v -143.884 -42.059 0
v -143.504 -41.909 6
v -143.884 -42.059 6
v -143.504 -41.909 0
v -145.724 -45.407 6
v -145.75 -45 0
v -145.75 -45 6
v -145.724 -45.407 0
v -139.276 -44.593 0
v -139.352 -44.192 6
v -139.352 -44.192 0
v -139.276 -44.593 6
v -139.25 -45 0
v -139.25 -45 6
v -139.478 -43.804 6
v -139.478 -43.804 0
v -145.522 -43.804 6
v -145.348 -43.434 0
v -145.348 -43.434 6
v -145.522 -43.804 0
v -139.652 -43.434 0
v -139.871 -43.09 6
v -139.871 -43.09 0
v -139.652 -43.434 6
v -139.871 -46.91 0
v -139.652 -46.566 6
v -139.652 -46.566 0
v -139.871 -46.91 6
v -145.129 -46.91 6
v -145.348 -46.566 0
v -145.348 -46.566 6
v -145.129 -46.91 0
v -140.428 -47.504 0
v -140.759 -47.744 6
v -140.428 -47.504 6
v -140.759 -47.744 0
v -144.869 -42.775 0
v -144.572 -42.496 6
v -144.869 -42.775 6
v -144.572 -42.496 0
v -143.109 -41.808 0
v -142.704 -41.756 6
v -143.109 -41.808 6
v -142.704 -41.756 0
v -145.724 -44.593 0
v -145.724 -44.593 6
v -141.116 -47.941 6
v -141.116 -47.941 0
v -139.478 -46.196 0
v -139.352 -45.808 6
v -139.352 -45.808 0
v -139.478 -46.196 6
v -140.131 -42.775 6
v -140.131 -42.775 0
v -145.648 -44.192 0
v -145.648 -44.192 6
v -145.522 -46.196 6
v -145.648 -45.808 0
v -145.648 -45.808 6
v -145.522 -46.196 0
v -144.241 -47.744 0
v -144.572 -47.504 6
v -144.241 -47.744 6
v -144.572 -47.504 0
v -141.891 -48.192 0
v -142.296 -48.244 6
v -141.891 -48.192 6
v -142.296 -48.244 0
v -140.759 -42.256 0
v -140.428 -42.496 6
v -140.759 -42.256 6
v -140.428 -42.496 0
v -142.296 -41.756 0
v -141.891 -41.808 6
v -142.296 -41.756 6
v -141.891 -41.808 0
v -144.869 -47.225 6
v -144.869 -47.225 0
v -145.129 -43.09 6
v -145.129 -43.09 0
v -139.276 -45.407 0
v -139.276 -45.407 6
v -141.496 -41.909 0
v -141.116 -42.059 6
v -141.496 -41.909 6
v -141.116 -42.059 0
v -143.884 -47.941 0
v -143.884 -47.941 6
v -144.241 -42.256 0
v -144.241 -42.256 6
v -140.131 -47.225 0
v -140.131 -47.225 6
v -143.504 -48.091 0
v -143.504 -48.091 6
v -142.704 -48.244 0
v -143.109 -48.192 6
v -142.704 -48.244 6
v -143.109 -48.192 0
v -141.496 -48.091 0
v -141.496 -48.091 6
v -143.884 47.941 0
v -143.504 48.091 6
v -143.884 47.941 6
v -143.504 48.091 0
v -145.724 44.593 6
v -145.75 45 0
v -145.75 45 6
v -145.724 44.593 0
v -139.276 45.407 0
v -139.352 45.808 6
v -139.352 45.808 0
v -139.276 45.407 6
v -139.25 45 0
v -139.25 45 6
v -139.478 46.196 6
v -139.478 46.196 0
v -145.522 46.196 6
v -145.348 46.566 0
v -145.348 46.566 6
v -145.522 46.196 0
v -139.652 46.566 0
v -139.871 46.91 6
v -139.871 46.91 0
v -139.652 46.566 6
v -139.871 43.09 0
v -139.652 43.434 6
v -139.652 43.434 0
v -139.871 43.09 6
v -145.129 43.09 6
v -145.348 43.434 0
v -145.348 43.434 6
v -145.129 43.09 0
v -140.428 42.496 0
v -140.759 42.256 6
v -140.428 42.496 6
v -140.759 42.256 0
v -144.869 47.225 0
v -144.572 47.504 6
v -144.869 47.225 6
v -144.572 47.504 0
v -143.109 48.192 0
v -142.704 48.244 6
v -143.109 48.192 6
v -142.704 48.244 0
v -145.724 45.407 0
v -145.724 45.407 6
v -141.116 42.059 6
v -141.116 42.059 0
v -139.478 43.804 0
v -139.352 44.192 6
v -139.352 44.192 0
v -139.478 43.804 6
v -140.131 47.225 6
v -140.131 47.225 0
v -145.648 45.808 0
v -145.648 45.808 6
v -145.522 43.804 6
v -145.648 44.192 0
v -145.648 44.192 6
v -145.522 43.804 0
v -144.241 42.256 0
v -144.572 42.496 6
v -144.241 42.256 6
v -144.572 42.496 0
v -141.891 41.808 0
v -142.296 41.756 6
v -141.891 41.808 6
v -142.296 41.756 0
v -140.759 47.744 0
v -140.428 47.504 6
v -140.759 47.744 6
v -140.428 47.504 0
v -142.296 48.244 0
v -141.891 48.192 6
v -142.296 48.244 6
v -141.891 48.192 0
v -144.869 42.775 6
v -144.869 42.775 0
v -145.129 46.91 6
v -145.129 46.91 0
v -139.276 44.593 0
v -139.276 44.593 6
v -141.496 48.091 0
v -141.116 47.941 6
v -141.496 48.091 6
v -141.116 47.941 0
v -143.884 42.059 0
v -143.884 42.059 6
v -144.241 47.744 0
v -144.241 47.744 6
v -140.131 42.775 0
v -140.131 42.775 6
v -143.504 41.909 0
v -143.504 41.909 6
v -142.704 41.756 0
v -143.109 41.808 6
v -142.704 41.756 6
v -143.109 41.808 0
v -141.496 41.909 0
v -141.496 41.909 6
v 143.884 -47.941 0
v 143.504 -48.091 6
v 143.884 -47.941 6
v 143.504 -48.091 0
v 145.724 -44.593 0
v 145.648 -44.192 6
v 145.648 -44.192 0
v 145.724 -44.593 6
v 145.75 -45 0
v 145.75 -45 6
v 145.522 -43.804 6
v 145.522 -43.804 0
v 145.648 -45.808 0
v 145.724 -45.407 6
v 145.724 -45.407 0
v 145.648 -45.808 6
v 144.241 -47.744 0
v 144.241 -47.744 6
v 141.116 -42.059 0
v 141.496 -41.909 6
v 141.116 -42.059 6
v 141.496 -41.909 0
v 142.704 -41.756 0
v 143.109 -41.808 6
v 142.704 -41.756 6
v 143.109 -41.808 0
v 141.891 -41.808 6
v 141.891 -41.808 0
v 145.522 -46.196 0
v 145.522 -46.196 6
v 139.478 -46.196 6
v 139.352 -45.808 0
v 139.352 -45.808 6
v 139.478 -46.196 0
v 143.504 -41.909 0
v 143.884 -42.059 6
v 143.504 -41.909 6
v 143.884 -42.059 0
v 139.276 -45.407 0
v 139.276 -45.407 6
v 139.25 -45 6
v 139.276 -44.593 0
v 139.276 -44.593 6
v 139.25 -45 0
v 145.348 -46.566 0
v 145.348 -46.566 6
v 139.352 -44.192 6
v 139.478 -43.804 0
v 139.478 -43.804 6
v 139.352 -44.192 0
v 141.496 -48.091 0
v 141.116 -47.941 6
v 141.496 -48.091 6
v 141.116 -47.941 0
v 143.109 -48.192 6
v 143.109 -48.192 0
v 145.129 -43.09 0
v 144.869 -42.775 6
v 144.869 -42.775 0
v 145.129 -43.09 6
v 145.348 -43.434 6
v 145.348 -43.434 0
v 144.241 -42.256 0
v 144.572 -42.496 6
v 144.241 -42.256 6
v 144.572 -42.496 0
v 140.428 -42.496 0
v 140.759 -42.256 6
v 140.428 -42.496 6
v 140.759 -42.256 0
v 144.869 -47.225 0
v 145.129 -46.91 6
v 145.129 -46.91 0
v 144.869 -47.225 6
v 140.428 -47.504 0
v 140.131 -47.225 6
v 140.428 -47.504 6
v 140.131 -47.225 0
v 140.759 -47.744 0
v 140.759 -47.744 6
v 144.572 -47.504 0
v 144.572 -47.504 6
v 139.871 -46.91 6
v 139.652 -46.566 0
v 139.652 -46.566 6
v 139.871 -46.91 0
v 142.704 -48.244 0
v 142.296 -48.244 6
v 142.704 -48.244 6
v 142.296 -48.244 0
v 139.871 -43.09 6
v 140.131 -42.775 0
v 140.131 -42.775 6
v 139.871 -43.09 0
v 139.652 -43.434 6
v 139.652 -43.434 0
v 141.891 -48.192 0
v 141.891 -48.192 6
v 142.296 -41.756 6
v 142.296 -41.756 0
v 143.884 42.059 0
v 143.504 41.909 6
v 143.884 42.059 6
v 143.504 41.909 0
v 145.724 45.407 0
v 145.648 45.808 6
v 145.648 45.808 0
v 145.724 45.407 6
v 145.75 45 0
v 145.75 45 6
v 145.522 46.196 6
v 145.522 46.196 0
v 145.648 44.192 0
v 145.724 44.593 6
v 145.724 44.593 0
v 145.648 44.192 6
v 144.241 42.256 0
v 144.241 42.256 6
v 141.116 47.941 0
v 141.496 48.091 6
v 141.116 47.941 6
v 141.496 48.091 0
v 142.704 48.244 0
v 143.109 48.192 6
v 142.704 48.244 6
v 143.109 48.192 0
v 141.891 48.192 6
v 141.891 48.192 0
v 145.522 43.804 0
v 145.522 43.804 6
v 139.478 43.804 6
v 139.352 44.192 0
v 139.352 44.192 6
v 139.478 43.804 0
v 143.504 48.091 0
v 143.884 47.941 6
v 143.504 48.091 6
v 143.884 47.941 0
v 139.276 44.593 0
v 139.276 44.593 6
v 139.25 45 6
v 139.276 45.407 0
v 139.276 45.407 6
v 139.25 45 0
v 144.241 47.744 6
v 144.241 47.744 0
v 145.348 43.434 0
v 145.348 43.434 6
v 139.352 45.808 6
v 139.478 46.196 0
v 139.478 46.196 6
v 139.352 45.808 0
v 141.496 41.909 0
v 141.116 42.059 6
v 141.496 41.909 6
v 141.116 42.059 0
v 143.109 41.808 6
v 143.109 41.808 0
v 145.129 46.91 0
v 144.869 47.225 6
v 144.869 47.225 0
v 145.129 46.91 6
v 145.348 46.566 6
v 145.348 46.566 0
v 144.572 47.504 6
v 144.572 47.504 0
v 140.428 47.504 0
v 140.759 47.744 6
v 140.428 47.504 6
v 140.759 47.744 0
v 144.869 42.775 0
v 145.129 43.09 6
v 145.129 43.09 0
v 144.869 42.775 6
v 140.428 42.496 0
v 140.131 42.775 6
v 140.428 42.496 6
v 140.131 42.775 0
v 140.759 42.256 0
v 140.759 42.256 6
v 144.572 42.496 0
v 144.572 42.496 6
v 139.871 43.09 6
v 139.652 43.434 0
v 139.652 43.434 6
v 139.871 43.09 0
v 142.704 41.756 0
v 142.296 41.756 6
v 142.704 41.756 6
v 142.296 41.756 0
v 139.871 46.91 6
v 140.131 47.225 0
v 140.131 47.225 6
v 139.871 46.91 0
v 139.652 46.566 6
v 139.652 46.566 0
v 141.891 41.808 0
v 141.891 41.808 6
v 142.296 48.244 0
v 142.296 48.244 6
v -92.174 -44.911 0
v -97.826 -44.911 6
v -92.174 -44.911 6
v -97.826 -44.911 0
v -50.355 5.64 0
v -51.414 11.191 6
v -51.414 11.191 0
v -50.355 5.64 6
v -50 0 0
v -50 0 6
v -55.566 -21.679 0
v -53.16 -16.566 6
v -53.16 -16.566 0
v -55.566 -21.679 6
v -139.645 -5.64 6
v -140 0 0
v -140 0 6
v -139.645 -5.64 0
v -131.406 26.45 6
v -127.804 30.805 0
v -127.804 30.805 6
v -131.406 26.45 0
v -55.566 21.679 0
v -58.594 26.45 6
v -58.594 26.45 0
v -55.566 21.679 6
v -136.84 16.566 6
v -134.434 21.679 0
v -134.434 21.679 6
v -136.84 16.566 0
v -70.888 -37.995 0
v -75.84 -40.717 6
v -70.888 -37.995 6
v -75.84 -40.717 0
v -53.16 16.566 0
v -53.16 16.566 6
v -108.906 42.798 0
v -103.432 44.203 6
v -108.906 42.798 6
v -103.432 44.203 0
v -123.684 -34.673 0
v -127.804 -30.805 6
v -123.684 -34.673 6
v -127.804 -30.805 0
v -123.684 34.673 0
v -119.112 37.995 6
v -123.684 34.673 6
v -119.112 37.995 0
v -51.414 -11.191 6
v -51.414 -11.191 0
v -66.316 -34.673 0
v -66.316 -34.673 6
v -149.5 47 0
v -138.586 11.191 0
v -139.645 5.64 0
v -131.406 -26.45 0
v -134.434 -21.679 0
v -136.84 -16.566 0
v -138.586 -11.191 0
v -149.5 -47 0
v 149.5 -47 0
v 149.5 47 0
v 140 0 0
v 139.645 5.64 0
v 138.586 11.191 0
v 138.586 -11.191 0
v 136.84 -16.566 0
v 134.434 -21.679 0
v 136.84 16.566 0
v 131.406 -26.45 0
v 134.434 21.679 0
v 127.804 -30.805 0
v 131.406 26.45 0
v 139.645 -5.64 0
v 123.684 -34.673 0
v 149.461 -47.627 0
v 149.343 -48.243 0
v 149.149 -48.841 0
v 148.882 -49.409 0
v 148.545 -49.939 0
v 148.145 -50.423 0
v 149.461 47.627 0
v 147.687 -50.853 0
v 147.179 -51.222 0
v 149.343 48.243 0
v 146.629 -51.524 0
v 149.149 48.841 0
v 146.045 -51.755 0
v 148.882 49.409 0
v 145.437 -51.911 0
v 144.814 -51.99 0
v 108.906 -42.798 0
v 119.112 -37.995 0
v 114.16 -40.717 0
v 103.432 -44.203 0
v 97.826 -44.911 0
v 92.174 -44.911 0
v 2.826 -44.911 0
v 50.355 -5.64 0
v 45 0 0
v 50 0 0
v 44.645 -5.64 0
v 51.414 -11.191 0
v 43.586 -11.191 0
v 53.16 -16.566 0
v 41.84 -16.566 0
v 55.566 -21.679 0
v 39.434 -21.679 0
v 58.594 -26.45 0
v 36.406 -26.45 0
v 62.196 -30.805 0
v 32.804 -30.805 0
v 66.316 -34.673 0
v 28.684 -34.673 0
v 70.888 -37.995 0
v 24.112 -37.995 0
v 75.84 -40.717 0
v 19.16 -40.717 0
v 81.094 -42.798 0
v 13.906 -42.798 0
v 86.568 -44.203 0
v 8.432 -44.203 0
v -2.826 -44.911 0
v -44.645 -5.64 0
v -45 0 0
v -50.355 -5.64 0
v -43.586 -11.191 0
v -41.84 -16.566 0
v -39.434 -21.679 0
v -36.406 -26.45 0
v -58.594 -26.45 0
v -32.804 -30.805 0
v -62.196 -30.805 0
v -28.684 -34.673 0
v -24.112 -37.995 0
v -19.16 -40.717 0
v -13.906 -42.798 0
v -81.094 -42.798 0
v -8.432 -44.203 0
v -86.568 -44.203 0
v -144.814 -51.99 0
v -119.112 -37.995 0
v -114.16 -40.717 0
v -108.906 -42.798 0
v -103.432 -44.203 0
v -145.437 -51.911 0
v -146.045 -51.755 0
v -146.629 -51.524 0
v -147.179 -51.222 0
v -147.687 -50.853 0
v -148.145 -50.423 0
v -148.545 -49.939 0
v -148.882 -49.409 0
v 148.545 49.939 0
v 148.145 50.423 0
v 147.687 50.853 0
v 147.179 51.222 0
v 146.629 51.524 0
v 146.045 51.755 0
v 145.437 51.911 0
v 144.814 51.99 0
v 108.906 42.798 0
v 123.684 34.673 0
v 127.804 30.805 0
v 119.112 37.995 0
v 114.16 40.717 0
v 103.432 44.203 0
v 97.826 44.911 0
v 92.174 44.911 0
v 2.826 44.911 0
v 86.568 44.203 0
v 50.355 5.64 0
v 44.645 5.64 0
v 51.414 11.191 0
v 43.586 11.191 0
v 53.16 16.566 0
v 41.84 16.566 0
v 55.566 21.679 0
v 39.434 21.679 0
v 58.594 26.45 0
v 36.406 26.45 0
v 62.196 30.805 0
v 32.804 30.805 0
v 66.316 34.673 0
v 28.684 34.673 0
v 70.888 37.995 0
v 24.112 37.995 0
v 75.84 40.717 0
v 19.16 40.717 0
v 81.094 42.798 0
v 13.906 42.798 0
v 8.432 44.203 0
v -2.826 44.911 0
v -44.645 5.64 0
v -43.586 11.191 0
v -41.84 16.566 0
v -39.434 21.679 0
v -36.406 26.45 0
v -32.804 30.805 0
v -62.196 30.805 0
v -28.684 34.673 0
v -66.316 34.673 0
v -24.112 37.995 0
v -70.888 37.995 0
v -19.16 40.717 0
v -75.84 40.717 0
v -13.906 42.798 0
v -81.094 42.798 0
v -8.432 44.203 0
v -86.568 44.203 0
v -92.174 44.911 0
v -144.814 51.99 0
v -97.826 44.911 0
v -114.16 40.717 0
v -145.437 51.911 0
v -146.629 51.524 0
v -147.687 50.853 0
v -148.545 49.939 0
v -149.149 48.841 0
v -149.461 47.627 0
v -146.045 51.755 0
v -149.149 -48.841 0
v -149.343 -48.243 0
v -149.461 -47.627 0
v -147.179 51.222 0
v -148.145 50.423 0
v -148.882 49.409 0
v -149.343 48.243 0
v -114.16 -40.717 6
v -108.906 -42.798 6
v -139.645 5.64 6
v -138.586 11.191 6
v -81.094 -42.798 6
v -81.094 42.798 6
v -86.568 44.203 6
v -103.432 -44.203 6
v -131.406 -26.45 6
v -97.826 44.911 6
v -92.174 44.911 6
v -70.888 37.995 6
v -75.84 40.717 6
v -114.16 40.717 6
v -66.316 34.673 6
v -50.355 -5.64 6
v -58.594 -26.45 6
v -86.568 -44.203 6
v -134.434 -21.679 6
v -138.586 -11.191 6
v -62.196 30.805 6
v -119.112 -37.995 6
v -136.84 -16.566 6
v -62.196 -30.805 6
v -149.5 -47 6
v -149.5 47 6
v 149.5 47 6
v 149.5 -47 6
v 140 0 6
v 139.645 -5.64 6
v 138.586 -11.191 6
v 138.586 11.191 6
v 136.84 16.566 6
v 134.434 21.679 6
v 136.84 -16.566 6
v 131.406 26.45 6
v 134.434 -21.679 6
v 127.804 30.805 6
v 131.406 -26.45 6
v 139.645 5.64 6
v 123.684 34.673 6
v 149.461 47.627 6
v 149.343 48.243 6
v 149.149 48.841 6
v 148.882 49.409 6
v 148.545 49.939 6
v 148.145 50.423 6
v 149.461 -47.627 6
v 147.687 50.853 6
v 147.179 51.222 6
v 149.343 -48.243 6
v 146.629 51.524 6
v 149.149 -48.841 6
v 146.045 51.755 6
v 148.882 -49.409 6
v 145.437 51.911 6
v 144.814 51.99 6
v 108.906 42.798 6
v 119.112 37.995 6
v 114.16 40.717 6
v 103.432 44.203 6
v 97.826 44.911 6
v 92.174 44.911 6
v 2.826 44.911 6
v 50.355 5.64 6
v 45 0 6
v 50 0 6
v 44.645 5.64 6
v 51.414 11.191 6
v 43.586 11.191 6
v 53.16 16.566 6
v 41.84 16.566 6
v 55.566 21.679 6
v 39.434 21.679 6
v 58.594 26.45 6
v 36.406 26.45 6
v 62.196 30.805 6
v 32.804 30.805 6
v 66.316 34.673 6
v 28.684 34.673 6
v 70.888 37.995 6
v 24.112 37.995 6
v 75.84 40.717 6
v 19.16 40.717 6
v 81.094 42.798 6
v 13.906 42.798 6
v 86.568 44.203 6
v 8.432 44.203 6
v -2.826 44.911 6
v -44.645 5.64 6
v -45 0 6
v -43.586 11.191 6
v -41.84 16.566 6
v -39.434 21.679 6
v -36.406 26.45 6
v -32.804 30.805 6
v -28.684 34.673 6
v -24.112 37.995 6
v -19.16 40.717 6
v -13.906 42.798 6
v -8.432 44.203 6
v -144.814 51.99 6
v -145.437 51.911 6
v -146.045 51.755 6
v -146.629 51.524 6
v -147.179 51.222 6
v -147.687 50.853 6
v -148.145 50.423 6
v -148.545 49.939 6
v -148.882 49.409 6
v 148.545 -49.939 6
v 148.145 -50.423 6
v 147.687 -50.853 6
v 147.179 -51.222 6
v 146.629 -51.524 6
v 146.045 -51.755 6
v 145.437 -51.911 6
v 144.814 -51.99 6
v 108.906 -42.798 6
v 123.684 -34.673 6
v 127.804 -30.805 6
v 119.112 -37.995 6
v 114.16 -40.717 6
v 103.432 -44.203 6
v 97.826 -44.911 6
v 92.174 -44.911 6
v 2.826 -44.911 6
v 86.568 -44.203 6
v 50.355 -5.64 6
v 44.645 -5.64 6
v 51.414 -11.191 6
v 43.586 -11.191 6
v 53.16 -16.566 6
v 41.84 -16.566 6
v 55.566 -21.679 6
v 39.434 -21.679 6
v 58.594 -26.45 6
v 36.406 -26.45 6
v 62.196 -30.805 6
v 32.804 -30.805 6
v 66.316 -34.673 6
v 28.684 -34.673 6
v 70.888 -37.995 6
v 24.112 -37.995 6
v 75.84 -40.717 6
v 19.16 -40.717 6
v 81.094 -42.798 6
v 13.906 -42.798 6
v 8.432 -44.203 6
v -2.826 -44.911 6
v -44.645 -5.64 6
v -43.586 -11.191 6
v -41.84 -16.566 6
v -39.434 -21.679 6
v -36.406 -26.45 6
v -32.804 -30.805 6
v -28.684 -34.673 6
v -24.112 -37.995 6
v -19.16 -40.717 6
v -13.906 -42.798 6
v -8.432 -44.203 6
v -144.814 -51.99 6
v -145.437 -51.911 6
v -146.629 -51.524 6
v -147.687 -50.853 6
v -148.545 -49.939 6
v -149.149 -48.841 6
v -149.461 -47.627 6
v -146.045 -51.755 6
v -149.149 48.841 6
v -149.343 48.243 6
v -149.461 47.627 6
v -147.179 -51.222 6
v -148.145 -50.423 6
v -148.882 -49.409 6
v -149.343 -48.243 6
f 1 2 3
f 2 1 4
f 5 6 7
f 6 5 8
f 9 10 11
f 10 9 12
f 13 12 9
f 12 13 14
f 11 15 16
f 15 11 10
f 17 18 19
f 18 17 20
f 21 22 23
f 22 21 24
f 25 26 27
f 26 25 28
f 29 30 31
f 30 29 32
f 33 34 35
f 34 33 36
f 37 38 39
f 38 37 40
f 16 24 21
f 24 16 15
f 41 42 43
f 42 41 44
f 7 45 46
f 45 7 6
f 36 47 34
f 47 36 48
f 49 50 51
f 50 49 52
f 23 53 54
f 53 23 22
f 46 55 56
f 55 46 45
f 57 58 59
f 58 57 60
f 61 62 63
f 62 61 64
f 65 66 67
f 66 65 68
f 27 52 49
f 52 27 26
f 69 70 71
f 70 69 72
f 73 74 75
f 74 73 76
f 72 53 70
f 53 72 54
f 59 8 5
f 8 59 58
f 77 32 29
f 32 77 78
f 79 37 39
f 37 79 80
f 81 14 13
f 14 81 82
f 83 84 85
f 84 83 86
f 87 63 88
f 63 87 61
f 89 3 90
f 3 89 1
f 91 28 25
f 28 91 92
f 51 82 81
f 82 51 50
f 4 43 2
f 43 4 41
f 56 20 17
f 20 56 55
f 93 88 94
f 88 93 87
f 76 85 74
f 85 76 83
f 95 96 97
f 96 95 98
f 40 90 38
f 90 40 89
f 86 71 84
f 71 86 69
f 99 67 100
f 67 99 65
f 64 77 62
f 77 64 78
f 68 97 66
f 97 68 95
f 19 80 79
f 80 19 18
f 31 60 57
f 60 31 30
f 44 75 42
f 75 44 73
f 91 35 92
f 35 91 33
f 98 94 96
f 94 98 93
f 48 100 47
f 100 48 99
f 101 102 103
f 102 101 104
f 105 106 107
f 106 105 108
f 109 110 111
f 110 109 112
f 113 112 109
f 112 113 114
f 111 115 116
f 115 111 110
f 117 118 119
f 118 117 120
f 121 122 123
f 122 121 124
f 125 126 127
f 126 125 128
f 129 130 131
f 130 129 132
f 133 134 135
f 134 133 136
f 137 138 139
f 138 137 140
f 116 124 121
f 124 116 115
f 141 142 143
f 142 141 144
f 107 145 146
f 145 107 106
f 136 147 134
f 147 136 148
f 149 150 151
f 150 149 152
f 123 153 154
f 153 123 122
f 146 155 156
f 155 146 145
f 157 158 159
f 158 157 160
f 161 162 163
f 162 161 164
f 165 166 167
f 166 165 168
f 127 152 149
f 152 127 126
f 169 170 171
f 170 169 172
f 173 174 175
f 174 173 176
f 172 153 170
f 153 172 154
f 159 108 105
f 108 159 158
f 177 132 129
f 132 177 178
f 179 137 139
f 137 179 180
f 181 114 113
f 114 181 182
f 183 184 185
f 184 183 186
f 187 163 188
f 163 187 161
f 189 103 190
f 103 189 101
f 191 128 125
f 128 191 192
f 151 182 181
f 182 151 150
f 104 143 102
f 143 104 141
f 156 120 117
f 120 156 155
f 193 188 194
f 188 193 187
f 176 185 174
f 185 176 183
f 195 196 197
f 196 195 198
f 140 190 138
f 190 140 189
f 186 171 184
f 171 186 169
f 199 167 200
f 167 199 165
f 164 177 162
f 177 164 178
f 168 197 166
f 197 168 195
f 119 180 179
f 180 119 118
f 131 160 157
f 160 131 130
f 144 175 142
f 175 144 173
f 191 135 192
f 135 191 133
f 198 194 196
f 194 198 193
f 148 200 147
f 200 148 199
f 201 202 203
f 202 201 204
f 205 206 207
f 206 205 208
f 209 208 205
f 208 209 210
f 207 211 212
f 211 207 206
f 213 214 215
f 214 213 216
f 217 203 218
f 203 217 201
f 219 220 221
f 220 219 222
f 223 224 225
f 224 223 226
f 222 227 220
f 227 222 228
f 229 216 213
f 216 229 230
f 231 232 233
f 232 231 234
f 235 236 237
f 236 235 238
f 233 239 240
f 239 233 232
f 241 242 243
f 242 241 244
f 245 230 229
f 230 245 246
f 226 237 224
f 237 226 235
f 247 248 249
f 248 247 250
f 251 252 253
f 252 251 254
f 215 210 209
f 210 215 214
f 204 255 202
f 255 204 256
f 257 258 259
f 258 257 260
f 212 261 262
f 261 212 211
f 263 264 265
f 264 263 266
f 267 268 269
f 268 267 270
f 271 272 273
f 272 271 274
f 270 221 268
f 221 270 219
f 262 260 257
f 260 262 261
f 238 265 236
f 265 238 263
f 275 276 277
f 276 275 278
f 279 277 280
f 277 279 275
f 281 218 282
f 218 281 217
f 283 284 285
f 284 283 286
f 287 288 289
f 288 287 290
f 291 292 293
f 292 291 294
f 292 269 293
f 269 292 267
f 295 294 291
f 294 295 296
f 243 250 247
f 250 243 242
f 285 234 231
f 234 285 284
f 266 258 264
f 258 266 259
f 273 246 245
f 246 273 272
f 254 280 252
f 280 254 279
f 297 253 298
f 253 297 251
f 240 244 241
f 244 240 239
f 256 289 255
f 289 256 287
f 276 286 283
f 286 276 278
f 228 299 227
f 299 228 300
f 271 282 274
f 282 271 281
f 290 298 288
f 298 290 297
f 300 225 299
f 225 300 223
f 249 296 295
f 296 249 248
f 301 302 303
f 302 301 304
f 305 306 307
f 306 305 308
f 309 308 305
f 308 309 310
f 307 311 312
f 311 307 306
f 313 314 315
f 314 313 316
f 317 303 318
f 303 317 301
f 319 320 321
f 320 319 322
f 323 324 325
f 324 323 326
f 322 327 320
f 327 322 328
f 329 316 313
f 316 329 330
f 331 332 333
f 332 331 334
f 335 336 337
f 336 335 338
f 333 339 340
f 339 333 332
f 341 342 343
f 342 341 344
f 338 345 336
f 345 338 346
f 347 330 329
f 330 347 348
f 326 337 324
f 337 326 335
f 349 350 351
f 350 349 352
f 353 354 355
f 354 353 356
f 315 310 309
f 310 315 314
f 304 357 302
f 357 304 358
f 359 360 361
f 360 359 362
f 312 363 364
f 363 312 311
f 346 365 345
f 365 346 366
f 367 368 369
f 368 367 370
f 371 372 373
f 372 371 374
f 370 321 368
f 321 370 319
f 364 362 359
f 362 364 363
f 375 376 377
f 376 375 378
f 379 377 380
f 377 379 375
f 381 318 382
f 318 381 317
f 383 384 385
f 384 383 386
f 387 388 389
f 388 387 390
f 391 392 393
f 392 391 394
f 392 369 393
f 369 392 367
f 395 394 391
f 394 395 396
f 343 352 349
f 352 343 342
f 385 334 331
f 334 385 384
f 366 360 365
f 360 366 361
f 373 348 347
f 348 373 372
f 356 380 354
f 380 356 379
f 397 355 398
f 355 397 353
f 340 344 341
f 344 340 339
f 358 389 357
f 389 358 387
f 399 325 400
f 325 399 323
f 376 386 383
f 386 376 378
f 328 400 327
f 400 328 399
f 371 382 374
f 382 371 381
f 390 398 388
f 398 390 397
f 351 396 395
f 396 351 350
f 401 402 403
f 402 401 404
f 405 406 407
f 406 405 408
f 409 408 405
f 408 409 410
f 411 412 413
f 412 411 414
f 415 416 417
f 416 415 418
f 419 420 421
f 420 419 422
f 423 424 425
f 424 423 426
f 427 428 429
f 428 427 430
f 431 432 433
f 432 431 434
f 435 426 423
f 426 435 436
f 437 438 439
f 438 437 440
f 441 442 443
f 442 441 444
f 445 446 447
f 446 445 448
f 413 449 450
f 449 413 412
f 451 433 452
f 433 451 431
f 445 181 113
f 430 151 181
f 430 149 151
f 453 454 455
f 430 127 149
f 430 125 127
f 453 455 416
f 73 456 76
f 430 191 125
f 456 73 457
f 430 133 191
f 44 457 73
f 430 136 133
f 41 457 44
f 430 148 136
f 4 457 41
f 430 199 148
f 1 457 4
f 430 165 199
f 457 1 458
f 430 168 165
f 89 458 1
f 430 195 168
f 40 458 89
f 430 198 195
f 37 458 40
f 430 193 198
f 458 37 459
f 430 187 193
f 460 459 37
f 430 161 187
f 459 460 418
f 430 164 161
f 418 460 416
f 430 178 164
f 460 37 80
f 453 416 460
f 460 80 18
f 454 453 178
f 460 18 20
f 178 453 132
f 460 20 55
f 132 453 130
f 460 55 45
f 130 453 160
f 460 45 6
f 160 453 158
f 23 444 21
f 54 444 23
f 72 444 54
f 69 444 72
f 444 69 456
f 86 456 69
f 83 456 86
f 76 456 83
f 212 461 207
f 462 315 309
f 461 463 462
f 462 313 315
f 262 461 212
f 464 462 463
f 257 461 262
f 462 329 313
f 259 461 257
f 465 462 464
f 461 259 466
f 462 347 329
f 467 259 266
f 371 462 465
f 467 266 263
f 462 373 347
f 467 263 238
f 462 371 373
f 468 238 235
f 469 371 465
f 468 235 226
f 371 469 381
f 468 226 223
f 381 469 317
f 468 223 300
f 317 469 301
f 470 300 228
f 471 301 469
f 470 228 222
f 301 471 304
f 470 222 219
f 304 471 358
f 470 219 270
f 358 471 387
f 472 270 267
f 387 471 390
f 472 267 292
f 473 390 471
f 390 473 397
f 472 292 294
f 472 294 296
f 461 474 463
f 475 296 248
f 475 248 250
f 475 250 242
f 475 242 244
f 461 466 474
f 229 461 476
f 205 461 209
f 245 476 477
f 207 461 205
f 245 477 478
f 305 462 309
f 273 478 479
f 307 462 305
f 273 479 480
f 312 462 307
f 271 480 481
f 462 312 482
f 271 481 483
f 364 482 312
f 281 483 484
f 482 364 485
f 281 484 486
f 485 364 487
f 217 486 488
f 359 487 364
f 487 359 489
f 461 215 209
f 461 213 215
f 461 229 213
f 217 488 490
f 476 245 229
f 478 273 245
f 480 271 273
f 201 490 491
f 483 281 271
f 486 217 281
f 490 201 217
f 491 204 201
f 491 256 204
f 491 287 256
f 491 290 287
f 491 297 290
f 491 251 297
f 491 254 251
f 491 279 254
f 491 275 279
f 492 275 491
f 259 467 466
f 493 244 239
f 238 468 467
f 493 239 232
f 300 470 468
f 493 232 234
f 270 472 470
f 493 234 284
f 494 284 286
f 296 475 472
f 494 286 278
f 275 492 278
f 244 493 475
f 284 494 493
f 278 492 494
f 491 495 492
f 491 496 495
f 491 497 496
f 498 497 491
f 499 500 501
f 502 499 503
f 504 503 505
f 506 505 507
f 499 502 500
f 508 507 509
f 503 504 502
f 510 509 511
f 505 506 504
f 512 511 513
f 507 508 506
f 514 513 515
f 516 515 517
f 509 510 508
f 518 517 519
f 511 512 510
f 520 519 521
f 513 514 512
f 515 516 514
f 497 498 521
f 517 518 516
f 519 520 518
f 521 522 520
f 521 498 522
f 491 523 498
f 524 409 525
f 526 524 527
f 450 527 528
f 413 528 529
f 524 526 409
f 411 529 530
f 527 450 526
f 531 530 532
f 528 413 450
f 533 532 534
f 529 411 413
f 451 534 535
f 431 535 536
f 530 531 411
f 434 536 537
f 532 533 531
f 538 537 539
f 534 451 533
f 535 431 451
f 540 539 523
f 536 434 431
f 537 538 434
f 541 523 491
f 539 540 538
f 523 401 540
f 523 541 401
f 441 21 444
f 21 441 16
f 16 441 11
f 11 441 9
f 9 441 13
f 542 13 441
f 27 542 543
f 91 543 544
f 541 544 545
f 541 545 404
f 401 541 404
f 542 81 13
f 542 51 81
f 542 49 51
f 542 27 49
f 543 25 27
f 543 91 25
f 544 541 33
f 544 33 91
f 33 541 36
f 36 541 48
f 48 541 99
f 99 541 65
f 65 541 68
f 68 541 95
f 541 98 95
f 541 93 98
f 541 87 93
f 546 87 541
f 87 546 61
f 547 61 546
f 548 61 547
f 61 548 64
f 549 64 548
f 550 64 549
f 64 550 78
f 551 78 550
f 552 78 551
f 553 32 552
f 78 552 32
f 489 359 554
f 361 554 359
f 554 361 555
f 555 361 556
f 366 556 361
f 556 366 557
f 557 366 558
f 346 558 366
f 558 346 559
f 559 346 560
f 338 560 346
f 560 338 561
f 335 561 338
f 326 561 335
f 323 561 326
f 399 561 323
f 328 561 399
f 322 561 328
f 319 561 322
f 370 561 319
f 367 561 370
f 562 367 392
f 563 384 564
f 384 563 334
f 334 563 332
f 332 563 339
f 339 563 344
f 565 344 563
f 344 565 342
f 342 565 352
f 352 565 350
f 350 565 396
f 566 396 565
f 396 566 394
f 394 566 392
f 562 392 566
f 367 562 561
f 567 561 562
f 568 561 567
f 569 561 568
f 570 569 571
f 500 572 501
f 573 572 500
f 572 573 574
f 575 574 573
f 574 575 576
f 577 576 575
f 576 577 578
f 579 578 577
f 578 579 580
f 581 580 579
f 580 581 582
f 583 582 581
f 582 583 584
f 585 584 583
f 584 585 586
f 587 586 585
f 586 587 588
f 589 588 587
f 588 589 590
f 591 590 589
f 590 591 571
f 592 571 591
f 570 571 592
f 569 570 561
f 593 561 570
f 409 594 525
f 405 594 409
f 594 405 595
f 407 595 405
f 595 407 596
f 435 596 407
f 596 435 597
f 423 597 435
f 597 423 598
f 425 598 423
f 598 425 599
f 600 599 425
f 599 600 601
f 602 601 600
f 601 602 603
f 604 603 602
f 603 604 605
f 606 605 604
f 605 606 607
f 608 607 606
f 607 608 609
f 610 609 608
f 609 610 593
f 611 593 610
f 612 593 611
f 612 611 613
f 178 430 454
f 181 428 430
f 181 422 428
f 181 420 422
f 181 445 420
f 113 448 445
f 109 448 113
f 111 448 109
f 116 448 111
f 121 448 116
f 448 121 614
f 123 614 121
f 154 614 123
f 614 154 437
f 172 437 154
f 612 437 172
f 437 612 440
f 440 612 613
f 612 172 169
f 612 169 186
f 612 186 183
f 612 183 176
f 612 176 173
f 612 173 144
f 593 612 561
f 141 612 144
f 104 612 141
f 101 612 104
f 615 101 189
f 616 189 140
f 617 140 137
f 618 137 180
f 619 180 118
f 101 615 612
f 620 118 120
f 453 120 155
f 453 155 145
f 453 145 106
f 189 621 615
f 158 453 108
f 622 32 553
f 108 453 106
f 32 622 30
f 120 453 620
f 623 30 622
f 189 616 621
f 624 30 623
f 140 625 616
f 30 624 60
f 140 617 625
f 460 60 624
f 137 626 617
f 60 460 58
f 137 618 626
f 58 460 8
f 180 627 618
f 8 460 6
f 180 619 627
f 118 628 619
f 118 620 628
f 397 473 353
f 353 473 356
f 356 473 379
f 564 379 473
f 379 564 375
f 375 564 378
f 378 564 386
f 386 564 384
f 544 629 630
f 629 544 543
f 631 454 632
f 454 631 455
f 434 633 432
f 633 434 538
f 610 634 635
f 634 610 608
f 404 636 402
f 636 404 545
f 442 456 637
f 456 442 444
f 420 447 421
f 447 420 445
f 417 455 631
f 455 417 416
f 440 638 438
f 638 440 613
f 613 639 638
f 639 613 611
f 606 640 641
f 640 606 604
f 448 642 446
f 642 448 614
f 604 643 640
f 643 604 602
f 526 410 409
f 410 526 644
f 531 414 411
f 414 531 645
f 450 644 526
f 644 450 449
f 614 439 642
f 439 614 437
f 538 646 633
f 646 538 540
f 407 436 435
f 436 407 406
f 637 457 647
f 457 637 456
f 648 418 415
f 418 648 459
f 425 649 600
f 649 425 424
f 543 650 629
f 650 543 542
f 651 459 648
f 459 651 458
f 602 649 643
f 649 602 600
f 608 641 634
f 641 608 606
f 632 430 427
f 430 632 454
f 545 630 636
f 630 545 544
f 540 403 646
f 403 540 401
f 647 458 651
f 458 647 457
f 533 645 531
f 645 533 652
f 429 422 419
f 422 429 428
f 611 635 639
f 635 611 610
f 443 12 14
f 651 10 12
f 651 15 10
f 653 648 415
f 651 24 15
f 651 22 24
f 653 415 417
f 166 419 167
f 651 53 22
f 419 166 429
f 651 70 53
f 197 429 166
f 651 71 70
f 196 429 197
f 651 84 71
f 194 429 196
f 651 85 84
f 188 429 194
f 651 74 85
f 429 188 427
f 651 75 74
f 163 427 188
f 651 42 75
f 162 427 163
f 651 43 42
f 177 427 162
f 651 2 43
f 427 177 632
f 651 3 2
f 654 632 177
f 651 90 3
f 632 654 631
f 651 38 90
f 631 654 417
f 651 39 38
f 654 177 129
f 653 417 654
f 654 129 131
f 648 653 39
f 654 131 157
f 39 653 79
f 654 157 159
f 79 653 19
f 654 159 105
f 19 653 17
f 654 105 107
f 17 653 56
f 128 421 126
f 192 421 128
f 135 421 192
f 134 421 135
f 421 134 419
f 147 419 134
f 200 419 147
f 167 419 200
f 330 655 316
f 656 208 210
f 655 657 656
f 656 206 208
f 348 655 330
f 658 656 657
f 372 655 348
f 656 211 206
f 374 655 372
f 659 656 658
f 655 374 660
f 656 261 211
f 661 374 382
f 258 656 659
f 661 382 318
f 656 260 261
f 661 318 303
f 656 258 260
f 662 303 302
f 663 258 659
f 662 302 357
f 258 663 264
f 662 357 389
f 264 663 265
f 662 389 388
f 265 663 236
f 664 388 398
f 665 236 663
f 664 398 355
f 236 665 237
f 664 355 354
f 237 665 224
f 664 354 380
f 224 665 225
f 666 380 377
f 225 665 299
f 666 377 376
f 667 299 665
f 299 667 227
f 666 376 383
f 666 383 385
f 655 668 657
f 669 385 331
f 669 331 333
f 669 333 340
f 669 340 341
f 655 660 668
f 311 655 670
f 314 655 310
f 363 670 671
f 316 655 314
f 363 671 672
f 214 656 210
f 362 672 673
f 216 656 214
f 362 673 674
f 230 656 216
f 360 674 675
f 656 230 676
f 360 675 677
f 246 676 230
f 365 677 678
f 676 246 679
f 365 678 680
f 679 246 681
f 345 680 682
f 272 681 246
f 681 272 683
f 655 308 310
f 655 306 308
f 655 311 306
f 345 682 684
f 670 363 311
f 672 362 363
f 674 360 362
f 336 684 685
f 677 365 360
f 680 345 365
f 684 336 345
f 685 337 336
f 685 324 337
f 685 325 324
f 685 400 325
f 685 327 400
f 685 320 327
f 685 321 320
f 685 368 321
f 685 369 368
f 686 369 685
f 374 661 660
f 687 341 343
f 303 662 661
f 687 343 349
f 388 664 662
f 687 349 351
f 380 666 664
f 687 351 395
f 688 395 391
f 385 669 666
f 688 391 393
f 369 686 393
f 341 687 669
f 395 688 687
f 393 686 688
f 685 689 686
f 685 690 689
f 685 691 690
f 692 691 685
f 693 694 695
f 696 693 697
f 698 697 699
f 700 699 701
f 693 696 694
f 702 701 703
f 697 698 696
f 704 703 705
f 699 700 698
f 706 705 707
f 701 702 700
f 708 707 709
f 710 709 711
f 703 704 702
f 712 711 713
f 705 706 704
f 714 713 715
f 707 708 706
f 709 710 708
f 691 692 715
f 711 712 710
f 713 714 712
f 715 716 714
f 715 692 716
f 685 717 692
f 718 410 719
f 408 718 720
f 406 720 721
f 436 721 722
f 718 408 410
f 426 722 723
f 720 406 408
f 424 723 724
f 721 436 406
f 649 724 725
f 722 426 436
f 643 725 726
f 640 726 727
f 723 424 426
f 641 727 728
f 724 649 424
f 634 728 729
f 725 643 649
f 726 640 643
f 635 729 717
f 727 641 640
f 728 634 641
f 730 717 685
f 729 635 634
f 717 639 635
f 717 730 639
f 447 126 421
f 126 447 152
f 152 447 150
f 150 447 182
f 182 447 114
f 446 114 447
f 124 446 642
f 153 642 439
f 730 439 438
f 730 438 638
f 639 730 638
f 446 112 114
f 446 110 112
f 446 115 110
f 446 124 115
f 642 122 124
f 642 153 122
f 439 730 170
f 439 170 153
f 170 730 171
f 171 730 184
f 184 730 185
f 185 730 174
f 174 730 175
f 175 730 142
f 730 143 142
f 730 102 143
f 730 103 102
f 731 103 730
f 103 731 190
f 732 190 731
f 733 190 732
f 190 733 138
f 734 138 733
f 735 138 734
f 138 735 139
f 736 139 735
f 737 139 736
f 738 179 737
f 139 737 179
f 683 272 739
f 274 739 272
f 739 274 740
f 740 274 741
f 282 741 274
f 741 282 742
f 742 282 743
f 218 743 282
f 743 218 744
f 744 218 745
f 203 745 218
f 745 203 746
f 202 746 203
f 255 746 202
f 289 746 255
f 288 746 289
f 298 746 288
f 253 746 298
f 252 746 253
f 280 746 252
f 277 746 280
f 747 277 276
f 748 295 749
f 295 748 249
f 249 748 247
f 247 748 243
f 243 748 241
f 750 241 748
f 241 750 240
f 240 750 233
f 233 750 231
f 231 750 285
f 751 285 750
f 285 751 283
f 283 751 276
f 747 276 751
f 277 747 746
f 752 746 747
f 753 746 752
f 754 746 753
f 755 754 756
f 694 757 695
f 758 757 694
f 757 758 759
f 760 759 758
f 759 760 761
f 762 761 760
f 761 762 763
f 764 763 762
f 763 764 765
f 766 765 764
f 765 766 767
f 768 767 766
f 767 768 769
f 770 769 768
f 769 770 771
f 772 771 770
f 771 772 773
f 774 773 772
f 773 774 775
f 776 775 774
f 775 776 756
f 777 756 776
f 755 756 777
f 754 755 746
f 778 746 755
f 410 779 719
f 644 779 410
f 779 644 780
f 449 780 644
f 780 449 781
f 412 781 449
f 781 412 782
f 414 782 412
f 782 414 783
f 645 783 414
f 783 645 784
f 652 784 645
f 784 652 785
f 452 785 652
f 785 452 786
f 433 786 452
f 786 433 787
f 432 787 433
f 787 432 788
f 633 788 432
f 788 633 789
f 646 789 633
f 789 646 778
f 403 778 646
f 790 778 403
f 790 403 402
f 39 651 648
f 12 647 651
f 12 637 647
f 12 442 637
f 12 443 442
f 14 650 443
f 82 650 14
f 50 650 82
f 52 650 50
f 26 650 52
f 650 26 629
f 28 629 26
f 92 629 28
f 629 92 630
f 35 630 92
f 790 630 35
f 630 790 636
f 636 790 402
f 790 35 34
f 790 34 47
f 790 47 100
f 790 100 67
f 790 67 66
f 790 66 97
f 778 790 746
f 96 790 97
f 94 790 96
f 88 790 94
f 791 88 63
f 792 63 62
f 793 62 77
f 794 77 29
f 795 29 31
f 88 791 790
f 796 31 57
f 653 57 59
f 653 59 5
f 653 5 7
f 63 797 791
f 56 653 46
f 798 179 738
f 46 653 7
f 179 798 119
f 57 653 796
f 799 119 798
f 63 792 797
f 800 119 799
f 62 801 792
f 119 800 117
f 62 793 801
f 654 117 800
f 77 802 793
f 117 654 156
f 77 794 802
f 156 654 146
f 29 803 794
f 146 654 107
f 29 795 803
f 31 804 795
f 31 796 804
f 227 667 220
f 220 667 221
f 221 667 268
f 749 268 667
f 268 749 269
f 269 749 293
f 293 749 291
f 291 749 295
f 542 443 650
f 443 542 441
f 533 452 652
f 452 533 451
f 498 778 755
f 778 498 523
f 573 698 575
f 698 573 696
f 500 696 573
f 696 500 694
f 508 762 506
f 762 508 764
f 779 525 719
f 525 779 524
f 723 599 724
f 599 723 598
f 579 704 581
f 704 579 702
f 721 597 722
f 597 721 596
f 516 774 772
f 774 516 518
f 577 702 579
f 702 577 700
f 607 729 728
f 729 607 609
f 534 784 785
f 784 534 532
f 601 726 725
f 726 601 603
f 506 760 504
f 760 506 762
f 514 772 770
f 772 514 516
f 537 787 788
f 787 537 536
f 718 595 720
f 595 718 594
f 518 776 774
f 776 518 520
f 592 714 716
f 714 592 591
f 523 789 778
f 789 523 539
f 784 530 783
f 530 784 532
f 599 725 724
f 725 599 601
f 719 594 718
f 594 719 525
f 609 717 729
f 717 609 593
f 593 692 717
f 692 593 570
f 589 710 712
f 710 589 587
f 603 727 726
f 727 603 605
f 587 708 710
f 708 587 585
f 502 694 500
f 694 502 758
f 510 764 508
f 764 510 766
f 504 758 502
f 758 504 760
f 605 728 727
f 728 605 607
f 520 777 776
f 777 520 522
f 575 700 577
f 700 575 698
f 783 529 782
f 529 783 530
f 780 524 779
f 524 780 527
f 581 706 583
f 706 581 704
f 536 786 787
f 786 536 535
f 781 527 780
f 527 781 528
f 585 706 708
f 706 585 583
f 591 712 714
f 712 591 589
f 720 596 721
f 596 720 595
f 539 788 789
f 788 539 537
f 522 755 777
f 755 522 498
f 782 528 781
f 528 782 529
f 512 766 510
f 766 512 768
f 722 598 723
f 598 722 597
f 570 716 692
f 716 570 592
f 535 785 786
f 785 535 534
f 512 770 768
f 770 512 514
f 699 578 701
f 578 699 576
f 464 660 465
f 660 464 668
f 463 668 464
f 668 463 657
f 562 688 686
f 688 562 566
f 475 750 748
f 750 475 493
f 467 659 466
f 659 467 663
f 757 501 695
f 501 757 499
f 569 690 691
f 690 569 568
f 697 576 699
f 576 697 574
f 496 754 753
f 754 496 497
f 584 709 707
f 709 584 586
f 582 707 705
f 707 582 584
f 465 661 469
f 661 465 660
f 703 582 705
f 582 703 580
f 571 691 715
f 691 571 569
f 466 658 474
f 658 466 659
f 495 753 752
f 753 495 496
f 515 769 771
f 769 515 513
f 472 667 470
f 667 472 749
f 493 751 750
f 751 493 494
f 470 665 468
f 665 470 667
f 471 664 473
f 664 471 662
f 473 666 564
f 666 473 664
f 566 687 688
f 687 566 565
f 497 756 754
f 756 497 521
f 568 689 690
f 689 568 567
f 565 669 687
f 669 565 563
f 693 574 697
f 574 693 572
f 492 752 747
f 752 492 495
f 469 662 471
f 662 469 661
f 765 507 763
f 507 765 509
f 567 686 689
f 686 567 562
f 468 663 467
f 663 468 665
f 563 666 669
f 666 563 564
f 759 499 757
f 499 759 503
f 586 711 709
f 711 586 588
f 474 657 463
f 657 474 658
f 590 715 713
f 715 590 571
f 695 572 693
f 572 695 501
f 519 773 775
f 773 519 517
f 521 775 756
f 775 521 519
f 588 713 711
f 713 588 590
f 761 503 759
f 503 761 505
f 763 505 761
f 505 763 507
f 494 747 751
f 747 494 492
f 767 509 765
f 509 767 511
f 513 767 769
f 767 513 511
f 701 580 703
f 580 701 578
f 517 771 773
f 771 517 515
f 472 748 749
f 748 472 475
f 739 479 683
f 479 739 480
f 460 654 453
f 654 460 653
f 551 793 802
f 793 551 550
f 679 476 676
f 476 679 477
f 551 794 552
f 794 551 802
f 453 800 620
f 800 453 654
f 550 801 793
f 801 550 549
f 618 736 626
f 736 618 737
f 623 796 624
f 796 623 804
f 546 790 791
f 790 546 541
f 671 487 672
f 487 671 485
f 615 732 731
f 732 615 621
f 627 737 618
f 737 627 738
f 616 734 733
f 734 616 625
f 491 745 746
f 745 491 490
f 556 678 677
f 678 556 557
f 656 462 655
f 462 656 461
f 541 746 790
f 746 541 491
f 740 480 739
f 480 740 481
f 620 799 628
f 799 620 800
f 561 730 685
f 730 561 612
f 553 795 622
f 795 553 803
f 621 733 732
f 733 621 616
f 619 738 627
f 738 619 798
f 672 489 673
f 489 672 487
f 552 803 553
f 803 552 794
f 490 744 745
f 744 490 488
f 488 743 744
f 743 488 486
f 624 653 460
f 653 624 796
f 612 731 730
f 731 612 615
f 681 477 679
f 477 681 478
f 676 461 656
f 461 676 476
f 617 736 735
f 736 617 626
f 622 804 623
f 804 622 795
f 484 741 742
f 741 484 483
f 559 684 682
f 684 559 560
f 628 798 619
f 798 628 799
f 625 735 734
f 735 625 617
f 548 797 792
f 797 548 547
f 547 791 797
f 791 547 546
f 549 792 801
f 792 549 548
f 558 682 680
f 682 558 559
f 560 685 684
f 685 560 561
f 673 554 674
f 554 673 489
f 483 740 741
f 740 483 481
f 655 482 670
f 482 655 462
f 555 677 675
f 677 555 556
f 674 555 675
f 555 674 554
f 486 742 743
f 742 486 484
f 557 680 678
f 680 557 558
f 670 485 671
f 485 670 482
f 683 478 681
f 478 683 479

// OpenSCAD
$fn = 50;


difference() {
	union() {
		hull() {
			translate(v = [-144.5000000000, 47.0000000000, 0]) {
				cylinder(h = 6, r = 5);
			}
			translate(v = [144.5000000000, 47.0000000000, 0]) {
				cylinder(h = 6, r = 5);
			}
			translate(v = [-144.5000000000, -47.0000000000, 0]) {
				cylinder(h = 6, r = 5);
			}
			translate(v = [144.5000000000, -47.0000000000, 0]) {
				cylinder(h = 6, r = 5);
			}
		}
	}
	union() {
		#translate(v = [-142.5000000000, -45.0000000000, -100.0000000000]) {
			cylinder(h = 200, r = 3.2500000000);
		}
		#translate(v = [-142.5000000000, 45.0000000000, -100.0000000000]) {
			cylinder(h = 200, r = 3.2500000000);
		}
		#translate(v = [142.5000000000, -45.0000000000, -100.0000000000]) {
			cylinder(h = 200, r = 3.2500000000);
		}
		#translate(v = [142.5000000000, 45.0000000000, -100.0000000000]) {
			cylinder(h = 200, r = 3.2500000000);
		}
		#translate(v = [-95.0000000000, 0, 0]) {
			cylinder(h = 6, r = 45.0000000000);
		}
		#cylinder(h = 6, r = 45.0000000000);
		#translate(v = [95.0000000000, 0, 0]) {
			cylinder(h = 6, r = 45.0000000000);
		}
	}
}
